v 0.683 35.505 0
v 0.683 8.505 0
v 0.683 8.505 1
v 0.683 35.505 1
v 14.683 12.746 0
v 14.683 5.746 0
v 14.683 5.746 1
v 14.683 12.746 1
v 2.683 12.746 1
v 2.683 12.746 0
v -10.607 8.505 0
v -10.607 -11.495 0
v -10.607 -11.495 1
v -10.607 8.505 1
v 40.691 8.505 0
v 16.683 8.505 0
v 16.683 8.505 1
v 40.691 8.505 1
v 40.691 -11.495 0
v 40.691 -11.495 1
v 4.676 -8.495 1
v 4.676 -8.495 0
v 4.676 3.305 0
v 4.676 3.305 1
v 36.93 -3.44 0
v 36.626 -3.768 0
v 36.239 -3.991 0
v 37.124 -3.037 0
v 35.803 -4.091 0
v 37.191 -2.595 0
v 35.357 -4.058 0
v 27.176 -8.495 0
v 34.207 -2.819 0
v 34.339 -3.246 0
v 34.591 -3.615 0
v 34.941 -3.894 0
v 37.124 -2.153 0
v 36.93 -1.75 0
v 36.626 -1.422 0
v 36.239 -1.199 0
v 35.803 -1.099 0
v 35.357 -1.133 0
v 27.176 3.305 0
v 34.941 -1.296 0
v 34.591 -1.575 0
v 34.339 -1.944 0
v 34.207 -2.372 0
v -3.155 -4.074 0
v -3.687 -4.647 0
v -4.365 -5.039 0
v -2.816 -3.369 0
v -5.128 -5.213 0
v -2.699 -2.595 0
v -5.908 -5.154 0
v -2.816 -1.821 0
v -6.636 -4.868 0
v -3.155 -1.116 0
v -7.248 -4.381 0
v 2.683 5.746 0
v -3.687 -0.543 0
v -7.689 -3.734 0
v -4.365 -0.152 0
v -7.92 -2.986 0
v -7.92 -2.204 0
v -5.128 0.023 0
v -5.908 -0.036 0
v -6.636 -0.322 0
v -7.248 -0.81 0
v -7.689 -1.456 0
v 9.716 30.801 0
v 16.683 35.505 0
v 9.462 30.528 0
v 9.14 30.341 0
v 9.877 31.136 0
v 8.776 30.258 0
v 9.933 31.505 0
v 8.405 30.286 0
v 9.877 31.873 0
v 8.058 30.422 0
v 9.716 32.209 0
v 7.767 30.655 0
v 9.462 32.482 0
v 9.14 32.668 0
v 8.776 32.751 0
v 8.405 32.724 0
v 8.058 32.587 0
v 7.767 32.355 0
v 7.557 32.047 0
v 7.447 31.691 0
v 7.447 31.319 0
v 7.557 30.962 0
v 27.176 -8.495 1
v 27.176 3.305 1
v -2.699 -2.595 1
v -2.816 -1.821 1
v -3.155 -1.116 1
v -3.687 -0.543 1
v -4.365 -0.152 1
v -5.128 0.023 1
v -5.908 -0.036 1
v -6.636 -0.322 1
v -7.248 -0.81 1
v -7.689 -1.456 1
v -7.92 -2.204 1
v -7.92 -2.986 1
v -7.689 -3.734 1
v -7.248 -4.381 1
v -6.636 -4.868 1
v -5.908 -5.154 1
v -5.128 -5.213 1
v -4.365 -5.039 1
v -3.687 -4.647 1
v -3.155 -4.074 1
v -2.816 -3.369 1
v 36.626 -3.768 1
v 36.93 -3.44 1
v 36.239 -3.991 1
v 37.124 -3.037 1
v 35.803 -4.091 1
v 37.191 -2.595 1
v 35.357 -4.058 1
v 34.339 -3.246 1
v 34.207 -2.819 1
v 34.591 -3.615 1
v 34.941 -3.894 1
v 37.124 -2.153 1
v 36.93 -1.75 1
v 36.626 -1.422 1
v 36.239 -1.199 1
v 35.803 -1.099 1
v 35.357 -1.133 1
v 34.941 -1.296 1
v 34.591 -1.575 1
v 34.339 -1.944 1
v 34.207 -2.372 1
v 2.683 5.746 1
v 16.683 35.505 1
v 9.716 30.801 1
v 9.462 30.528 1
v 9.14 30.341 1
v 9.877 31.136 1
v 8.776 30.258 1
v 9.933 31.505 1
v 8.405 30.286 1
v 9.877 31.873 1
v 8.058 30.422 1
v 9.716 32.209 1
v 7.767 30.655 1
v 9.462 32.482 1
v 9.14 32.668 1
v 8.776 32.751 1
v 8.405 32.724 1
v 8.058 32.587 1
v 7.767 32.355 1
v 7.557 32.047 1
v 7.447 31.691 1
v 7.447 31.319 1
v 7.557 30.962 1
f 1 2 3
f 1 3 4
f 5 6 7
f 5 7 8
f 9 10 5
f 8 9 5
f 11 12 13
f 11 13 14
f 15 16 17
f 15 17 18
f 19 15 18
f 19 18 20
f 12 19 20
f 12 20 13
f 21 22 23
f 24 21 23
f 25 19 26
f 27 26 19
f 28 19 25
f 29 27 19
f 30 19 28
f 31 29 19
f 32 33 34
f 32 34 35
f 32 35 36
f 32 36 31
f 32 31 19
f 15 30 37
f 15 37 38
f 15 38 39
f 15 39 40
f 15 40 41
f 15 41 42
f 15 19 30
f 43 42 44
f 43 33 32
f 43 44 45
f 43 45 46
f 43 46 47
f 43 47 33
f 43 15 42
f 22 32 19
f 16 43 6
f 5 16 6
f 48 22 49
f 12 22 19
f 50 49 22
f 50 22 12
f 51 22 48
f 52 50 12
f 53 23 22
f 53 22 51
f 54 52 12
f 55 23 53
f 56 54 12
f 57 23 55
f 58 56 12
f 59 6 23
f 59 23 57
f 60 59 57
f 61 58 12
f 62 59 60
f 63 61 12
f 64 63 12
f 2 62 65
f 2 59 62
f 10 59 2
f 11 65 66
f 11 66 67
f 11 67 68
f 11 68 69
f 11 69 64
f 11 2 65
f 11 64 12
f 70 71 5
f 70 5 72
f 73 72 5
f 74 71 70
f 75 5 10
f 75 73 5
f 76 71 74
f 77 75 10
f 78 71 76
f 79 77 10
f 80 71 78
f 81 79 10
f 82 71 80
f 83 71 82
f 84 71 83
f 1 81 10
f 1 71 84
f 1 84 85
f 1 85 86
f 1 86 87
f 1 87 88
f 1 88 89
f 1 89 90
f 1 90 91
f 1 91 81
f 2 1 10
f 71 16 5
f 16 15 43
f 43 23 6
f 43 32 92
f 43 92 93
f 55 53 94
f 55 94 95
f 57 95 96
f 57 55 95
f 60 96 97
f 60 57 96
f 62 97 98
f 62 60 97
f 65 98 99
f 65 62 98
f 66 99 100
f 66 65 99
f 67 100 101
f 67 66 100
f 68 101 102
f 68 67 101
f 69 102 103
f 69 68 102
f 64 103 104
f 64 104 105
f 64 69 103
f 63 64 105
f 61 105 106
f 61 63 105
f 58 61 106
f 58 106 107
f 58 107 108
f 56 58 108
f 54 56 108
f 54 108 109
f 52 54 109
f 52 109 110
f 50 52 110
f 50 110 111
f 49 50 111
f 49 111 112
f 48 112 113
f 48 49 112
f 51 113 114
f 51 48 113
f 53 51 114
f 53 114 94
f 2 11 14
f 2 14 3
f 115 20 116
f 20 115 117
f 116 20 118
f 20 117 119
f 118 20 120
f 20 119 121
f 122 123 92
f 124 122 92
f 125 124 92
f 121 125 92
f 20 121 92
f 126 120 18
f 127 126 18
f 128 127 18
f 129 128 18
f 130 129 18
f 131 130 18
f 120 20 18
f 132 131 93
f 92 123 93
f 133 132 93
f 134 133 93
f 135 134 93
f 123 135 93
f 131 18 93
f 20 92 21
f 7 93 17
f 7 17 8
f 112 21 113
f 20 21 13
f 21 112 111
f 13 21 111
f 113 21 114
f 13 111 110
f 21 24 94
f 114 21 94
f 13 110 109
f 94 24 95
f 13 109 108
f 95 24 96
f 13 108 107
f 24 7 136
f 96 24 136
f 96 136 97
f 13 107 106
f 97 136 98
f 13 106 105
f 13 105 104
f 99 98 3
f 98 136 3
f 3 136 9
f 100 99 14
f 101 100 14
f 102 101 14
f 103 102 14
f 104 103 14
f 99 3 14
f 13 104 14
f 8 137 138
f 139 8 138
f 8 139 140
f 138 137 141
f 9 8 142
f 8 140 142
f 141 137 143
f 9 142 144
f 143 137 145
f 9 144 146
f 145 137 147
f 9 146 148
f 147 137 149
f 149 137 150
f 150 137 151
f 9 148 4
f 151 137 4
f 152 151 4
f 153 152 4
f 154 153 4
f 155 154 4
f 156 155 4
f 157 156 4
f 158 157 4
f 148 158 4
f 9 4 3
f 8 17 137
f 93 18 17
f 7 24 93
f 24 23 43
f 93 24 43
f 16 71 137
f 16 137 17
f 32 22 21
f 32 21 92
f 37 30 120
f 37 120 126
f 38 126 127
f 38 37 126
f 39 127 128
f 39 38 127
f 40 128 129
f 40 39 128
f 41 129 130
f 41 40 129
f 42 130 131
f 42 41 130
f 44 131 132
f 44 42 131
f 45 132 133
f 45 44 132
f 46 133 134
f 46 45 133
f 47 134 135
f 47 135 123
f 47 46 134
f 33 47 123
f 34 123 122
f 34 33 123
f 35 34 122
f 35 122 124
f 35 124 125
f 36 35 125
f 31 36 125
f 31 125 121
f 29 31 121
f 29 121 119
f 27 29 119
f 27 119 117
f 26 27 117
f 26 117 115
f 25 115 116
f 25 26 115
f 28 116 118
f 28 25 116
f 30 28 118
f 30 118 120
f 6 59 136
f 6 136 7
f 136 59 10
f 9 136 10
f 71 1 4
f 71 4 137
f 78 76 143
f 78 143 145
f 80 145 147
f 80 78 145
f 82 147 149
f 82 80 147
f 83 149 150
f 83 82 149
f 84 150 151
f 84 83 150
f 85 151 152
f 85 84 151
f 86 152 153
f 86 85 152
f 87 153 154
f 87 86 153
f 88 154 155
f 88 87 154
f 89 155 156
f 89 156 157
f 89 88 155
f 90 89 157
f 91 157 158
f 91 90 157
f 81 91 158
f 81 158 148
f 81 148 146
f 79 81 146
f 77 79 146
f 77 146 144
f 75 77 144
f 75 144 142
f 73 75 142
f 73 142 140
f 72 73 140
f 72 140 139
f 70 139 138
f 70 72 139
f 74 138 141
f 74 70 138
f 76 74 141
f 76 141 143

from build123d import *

# Parameters (mm, degrees)
CROQUIS1_R              = 1.25
CROQUIS1_R_2            = 2.625
CROQUIS1_R_3            = 1.5
CROQUIS1_W              = 22.5
CROQUIS1_H              = 11.8
CROQUIS1_W_2            = 12
CROQUIS1_H_2            = 7
SALIENTE_EXTRUIR1_DEPTH = 1


with BuildPart() as part:
    # Croquis1 → Saliente-Extruir1 (new body)
    with BuildSketch(Plane.XY):
        Polygon((0.682906484, 8.504854369), (0.682906484, 35.504854369), (16.682906484, 35.504854369), (16.682906484, 8.504854369), (40.690737834, 8.504854369), (40.690737834, -11.495145631), (-10.607093516, -11.495145631), (-10.607093516, 8.504854369), align=None)
        with Locations((8.682906484, 31.504854369)):
            Circle(CROQUIS1_R, mode=Mode.SUBTRACT)
        with Locations((-5.323911872, -2.595145631)):
            Circle(CROQUIS1_R_2, mode=Mode.SUBTRACT)
        with Locations((35.690737834, -2.595145631)):
            Circle(CROQUIS1_R_3, mode=Mode.SUBTRACT)
        with Locations((15.926088128, -2.595145631)):
            Rectangle(CROQUIS1_W, CROQUIS1_H, mode=Mode.SUBTRACT)
        with Locations((8.682906484, 9.246132474)):
            Rectangle(CROQUIS1_W_2, CROQUIS1_H_2, mode=Mode.SUBTRACT)
    extrude(amount=SALIENTE_EXTRUIR1_DEPTH)


solid = part.part
